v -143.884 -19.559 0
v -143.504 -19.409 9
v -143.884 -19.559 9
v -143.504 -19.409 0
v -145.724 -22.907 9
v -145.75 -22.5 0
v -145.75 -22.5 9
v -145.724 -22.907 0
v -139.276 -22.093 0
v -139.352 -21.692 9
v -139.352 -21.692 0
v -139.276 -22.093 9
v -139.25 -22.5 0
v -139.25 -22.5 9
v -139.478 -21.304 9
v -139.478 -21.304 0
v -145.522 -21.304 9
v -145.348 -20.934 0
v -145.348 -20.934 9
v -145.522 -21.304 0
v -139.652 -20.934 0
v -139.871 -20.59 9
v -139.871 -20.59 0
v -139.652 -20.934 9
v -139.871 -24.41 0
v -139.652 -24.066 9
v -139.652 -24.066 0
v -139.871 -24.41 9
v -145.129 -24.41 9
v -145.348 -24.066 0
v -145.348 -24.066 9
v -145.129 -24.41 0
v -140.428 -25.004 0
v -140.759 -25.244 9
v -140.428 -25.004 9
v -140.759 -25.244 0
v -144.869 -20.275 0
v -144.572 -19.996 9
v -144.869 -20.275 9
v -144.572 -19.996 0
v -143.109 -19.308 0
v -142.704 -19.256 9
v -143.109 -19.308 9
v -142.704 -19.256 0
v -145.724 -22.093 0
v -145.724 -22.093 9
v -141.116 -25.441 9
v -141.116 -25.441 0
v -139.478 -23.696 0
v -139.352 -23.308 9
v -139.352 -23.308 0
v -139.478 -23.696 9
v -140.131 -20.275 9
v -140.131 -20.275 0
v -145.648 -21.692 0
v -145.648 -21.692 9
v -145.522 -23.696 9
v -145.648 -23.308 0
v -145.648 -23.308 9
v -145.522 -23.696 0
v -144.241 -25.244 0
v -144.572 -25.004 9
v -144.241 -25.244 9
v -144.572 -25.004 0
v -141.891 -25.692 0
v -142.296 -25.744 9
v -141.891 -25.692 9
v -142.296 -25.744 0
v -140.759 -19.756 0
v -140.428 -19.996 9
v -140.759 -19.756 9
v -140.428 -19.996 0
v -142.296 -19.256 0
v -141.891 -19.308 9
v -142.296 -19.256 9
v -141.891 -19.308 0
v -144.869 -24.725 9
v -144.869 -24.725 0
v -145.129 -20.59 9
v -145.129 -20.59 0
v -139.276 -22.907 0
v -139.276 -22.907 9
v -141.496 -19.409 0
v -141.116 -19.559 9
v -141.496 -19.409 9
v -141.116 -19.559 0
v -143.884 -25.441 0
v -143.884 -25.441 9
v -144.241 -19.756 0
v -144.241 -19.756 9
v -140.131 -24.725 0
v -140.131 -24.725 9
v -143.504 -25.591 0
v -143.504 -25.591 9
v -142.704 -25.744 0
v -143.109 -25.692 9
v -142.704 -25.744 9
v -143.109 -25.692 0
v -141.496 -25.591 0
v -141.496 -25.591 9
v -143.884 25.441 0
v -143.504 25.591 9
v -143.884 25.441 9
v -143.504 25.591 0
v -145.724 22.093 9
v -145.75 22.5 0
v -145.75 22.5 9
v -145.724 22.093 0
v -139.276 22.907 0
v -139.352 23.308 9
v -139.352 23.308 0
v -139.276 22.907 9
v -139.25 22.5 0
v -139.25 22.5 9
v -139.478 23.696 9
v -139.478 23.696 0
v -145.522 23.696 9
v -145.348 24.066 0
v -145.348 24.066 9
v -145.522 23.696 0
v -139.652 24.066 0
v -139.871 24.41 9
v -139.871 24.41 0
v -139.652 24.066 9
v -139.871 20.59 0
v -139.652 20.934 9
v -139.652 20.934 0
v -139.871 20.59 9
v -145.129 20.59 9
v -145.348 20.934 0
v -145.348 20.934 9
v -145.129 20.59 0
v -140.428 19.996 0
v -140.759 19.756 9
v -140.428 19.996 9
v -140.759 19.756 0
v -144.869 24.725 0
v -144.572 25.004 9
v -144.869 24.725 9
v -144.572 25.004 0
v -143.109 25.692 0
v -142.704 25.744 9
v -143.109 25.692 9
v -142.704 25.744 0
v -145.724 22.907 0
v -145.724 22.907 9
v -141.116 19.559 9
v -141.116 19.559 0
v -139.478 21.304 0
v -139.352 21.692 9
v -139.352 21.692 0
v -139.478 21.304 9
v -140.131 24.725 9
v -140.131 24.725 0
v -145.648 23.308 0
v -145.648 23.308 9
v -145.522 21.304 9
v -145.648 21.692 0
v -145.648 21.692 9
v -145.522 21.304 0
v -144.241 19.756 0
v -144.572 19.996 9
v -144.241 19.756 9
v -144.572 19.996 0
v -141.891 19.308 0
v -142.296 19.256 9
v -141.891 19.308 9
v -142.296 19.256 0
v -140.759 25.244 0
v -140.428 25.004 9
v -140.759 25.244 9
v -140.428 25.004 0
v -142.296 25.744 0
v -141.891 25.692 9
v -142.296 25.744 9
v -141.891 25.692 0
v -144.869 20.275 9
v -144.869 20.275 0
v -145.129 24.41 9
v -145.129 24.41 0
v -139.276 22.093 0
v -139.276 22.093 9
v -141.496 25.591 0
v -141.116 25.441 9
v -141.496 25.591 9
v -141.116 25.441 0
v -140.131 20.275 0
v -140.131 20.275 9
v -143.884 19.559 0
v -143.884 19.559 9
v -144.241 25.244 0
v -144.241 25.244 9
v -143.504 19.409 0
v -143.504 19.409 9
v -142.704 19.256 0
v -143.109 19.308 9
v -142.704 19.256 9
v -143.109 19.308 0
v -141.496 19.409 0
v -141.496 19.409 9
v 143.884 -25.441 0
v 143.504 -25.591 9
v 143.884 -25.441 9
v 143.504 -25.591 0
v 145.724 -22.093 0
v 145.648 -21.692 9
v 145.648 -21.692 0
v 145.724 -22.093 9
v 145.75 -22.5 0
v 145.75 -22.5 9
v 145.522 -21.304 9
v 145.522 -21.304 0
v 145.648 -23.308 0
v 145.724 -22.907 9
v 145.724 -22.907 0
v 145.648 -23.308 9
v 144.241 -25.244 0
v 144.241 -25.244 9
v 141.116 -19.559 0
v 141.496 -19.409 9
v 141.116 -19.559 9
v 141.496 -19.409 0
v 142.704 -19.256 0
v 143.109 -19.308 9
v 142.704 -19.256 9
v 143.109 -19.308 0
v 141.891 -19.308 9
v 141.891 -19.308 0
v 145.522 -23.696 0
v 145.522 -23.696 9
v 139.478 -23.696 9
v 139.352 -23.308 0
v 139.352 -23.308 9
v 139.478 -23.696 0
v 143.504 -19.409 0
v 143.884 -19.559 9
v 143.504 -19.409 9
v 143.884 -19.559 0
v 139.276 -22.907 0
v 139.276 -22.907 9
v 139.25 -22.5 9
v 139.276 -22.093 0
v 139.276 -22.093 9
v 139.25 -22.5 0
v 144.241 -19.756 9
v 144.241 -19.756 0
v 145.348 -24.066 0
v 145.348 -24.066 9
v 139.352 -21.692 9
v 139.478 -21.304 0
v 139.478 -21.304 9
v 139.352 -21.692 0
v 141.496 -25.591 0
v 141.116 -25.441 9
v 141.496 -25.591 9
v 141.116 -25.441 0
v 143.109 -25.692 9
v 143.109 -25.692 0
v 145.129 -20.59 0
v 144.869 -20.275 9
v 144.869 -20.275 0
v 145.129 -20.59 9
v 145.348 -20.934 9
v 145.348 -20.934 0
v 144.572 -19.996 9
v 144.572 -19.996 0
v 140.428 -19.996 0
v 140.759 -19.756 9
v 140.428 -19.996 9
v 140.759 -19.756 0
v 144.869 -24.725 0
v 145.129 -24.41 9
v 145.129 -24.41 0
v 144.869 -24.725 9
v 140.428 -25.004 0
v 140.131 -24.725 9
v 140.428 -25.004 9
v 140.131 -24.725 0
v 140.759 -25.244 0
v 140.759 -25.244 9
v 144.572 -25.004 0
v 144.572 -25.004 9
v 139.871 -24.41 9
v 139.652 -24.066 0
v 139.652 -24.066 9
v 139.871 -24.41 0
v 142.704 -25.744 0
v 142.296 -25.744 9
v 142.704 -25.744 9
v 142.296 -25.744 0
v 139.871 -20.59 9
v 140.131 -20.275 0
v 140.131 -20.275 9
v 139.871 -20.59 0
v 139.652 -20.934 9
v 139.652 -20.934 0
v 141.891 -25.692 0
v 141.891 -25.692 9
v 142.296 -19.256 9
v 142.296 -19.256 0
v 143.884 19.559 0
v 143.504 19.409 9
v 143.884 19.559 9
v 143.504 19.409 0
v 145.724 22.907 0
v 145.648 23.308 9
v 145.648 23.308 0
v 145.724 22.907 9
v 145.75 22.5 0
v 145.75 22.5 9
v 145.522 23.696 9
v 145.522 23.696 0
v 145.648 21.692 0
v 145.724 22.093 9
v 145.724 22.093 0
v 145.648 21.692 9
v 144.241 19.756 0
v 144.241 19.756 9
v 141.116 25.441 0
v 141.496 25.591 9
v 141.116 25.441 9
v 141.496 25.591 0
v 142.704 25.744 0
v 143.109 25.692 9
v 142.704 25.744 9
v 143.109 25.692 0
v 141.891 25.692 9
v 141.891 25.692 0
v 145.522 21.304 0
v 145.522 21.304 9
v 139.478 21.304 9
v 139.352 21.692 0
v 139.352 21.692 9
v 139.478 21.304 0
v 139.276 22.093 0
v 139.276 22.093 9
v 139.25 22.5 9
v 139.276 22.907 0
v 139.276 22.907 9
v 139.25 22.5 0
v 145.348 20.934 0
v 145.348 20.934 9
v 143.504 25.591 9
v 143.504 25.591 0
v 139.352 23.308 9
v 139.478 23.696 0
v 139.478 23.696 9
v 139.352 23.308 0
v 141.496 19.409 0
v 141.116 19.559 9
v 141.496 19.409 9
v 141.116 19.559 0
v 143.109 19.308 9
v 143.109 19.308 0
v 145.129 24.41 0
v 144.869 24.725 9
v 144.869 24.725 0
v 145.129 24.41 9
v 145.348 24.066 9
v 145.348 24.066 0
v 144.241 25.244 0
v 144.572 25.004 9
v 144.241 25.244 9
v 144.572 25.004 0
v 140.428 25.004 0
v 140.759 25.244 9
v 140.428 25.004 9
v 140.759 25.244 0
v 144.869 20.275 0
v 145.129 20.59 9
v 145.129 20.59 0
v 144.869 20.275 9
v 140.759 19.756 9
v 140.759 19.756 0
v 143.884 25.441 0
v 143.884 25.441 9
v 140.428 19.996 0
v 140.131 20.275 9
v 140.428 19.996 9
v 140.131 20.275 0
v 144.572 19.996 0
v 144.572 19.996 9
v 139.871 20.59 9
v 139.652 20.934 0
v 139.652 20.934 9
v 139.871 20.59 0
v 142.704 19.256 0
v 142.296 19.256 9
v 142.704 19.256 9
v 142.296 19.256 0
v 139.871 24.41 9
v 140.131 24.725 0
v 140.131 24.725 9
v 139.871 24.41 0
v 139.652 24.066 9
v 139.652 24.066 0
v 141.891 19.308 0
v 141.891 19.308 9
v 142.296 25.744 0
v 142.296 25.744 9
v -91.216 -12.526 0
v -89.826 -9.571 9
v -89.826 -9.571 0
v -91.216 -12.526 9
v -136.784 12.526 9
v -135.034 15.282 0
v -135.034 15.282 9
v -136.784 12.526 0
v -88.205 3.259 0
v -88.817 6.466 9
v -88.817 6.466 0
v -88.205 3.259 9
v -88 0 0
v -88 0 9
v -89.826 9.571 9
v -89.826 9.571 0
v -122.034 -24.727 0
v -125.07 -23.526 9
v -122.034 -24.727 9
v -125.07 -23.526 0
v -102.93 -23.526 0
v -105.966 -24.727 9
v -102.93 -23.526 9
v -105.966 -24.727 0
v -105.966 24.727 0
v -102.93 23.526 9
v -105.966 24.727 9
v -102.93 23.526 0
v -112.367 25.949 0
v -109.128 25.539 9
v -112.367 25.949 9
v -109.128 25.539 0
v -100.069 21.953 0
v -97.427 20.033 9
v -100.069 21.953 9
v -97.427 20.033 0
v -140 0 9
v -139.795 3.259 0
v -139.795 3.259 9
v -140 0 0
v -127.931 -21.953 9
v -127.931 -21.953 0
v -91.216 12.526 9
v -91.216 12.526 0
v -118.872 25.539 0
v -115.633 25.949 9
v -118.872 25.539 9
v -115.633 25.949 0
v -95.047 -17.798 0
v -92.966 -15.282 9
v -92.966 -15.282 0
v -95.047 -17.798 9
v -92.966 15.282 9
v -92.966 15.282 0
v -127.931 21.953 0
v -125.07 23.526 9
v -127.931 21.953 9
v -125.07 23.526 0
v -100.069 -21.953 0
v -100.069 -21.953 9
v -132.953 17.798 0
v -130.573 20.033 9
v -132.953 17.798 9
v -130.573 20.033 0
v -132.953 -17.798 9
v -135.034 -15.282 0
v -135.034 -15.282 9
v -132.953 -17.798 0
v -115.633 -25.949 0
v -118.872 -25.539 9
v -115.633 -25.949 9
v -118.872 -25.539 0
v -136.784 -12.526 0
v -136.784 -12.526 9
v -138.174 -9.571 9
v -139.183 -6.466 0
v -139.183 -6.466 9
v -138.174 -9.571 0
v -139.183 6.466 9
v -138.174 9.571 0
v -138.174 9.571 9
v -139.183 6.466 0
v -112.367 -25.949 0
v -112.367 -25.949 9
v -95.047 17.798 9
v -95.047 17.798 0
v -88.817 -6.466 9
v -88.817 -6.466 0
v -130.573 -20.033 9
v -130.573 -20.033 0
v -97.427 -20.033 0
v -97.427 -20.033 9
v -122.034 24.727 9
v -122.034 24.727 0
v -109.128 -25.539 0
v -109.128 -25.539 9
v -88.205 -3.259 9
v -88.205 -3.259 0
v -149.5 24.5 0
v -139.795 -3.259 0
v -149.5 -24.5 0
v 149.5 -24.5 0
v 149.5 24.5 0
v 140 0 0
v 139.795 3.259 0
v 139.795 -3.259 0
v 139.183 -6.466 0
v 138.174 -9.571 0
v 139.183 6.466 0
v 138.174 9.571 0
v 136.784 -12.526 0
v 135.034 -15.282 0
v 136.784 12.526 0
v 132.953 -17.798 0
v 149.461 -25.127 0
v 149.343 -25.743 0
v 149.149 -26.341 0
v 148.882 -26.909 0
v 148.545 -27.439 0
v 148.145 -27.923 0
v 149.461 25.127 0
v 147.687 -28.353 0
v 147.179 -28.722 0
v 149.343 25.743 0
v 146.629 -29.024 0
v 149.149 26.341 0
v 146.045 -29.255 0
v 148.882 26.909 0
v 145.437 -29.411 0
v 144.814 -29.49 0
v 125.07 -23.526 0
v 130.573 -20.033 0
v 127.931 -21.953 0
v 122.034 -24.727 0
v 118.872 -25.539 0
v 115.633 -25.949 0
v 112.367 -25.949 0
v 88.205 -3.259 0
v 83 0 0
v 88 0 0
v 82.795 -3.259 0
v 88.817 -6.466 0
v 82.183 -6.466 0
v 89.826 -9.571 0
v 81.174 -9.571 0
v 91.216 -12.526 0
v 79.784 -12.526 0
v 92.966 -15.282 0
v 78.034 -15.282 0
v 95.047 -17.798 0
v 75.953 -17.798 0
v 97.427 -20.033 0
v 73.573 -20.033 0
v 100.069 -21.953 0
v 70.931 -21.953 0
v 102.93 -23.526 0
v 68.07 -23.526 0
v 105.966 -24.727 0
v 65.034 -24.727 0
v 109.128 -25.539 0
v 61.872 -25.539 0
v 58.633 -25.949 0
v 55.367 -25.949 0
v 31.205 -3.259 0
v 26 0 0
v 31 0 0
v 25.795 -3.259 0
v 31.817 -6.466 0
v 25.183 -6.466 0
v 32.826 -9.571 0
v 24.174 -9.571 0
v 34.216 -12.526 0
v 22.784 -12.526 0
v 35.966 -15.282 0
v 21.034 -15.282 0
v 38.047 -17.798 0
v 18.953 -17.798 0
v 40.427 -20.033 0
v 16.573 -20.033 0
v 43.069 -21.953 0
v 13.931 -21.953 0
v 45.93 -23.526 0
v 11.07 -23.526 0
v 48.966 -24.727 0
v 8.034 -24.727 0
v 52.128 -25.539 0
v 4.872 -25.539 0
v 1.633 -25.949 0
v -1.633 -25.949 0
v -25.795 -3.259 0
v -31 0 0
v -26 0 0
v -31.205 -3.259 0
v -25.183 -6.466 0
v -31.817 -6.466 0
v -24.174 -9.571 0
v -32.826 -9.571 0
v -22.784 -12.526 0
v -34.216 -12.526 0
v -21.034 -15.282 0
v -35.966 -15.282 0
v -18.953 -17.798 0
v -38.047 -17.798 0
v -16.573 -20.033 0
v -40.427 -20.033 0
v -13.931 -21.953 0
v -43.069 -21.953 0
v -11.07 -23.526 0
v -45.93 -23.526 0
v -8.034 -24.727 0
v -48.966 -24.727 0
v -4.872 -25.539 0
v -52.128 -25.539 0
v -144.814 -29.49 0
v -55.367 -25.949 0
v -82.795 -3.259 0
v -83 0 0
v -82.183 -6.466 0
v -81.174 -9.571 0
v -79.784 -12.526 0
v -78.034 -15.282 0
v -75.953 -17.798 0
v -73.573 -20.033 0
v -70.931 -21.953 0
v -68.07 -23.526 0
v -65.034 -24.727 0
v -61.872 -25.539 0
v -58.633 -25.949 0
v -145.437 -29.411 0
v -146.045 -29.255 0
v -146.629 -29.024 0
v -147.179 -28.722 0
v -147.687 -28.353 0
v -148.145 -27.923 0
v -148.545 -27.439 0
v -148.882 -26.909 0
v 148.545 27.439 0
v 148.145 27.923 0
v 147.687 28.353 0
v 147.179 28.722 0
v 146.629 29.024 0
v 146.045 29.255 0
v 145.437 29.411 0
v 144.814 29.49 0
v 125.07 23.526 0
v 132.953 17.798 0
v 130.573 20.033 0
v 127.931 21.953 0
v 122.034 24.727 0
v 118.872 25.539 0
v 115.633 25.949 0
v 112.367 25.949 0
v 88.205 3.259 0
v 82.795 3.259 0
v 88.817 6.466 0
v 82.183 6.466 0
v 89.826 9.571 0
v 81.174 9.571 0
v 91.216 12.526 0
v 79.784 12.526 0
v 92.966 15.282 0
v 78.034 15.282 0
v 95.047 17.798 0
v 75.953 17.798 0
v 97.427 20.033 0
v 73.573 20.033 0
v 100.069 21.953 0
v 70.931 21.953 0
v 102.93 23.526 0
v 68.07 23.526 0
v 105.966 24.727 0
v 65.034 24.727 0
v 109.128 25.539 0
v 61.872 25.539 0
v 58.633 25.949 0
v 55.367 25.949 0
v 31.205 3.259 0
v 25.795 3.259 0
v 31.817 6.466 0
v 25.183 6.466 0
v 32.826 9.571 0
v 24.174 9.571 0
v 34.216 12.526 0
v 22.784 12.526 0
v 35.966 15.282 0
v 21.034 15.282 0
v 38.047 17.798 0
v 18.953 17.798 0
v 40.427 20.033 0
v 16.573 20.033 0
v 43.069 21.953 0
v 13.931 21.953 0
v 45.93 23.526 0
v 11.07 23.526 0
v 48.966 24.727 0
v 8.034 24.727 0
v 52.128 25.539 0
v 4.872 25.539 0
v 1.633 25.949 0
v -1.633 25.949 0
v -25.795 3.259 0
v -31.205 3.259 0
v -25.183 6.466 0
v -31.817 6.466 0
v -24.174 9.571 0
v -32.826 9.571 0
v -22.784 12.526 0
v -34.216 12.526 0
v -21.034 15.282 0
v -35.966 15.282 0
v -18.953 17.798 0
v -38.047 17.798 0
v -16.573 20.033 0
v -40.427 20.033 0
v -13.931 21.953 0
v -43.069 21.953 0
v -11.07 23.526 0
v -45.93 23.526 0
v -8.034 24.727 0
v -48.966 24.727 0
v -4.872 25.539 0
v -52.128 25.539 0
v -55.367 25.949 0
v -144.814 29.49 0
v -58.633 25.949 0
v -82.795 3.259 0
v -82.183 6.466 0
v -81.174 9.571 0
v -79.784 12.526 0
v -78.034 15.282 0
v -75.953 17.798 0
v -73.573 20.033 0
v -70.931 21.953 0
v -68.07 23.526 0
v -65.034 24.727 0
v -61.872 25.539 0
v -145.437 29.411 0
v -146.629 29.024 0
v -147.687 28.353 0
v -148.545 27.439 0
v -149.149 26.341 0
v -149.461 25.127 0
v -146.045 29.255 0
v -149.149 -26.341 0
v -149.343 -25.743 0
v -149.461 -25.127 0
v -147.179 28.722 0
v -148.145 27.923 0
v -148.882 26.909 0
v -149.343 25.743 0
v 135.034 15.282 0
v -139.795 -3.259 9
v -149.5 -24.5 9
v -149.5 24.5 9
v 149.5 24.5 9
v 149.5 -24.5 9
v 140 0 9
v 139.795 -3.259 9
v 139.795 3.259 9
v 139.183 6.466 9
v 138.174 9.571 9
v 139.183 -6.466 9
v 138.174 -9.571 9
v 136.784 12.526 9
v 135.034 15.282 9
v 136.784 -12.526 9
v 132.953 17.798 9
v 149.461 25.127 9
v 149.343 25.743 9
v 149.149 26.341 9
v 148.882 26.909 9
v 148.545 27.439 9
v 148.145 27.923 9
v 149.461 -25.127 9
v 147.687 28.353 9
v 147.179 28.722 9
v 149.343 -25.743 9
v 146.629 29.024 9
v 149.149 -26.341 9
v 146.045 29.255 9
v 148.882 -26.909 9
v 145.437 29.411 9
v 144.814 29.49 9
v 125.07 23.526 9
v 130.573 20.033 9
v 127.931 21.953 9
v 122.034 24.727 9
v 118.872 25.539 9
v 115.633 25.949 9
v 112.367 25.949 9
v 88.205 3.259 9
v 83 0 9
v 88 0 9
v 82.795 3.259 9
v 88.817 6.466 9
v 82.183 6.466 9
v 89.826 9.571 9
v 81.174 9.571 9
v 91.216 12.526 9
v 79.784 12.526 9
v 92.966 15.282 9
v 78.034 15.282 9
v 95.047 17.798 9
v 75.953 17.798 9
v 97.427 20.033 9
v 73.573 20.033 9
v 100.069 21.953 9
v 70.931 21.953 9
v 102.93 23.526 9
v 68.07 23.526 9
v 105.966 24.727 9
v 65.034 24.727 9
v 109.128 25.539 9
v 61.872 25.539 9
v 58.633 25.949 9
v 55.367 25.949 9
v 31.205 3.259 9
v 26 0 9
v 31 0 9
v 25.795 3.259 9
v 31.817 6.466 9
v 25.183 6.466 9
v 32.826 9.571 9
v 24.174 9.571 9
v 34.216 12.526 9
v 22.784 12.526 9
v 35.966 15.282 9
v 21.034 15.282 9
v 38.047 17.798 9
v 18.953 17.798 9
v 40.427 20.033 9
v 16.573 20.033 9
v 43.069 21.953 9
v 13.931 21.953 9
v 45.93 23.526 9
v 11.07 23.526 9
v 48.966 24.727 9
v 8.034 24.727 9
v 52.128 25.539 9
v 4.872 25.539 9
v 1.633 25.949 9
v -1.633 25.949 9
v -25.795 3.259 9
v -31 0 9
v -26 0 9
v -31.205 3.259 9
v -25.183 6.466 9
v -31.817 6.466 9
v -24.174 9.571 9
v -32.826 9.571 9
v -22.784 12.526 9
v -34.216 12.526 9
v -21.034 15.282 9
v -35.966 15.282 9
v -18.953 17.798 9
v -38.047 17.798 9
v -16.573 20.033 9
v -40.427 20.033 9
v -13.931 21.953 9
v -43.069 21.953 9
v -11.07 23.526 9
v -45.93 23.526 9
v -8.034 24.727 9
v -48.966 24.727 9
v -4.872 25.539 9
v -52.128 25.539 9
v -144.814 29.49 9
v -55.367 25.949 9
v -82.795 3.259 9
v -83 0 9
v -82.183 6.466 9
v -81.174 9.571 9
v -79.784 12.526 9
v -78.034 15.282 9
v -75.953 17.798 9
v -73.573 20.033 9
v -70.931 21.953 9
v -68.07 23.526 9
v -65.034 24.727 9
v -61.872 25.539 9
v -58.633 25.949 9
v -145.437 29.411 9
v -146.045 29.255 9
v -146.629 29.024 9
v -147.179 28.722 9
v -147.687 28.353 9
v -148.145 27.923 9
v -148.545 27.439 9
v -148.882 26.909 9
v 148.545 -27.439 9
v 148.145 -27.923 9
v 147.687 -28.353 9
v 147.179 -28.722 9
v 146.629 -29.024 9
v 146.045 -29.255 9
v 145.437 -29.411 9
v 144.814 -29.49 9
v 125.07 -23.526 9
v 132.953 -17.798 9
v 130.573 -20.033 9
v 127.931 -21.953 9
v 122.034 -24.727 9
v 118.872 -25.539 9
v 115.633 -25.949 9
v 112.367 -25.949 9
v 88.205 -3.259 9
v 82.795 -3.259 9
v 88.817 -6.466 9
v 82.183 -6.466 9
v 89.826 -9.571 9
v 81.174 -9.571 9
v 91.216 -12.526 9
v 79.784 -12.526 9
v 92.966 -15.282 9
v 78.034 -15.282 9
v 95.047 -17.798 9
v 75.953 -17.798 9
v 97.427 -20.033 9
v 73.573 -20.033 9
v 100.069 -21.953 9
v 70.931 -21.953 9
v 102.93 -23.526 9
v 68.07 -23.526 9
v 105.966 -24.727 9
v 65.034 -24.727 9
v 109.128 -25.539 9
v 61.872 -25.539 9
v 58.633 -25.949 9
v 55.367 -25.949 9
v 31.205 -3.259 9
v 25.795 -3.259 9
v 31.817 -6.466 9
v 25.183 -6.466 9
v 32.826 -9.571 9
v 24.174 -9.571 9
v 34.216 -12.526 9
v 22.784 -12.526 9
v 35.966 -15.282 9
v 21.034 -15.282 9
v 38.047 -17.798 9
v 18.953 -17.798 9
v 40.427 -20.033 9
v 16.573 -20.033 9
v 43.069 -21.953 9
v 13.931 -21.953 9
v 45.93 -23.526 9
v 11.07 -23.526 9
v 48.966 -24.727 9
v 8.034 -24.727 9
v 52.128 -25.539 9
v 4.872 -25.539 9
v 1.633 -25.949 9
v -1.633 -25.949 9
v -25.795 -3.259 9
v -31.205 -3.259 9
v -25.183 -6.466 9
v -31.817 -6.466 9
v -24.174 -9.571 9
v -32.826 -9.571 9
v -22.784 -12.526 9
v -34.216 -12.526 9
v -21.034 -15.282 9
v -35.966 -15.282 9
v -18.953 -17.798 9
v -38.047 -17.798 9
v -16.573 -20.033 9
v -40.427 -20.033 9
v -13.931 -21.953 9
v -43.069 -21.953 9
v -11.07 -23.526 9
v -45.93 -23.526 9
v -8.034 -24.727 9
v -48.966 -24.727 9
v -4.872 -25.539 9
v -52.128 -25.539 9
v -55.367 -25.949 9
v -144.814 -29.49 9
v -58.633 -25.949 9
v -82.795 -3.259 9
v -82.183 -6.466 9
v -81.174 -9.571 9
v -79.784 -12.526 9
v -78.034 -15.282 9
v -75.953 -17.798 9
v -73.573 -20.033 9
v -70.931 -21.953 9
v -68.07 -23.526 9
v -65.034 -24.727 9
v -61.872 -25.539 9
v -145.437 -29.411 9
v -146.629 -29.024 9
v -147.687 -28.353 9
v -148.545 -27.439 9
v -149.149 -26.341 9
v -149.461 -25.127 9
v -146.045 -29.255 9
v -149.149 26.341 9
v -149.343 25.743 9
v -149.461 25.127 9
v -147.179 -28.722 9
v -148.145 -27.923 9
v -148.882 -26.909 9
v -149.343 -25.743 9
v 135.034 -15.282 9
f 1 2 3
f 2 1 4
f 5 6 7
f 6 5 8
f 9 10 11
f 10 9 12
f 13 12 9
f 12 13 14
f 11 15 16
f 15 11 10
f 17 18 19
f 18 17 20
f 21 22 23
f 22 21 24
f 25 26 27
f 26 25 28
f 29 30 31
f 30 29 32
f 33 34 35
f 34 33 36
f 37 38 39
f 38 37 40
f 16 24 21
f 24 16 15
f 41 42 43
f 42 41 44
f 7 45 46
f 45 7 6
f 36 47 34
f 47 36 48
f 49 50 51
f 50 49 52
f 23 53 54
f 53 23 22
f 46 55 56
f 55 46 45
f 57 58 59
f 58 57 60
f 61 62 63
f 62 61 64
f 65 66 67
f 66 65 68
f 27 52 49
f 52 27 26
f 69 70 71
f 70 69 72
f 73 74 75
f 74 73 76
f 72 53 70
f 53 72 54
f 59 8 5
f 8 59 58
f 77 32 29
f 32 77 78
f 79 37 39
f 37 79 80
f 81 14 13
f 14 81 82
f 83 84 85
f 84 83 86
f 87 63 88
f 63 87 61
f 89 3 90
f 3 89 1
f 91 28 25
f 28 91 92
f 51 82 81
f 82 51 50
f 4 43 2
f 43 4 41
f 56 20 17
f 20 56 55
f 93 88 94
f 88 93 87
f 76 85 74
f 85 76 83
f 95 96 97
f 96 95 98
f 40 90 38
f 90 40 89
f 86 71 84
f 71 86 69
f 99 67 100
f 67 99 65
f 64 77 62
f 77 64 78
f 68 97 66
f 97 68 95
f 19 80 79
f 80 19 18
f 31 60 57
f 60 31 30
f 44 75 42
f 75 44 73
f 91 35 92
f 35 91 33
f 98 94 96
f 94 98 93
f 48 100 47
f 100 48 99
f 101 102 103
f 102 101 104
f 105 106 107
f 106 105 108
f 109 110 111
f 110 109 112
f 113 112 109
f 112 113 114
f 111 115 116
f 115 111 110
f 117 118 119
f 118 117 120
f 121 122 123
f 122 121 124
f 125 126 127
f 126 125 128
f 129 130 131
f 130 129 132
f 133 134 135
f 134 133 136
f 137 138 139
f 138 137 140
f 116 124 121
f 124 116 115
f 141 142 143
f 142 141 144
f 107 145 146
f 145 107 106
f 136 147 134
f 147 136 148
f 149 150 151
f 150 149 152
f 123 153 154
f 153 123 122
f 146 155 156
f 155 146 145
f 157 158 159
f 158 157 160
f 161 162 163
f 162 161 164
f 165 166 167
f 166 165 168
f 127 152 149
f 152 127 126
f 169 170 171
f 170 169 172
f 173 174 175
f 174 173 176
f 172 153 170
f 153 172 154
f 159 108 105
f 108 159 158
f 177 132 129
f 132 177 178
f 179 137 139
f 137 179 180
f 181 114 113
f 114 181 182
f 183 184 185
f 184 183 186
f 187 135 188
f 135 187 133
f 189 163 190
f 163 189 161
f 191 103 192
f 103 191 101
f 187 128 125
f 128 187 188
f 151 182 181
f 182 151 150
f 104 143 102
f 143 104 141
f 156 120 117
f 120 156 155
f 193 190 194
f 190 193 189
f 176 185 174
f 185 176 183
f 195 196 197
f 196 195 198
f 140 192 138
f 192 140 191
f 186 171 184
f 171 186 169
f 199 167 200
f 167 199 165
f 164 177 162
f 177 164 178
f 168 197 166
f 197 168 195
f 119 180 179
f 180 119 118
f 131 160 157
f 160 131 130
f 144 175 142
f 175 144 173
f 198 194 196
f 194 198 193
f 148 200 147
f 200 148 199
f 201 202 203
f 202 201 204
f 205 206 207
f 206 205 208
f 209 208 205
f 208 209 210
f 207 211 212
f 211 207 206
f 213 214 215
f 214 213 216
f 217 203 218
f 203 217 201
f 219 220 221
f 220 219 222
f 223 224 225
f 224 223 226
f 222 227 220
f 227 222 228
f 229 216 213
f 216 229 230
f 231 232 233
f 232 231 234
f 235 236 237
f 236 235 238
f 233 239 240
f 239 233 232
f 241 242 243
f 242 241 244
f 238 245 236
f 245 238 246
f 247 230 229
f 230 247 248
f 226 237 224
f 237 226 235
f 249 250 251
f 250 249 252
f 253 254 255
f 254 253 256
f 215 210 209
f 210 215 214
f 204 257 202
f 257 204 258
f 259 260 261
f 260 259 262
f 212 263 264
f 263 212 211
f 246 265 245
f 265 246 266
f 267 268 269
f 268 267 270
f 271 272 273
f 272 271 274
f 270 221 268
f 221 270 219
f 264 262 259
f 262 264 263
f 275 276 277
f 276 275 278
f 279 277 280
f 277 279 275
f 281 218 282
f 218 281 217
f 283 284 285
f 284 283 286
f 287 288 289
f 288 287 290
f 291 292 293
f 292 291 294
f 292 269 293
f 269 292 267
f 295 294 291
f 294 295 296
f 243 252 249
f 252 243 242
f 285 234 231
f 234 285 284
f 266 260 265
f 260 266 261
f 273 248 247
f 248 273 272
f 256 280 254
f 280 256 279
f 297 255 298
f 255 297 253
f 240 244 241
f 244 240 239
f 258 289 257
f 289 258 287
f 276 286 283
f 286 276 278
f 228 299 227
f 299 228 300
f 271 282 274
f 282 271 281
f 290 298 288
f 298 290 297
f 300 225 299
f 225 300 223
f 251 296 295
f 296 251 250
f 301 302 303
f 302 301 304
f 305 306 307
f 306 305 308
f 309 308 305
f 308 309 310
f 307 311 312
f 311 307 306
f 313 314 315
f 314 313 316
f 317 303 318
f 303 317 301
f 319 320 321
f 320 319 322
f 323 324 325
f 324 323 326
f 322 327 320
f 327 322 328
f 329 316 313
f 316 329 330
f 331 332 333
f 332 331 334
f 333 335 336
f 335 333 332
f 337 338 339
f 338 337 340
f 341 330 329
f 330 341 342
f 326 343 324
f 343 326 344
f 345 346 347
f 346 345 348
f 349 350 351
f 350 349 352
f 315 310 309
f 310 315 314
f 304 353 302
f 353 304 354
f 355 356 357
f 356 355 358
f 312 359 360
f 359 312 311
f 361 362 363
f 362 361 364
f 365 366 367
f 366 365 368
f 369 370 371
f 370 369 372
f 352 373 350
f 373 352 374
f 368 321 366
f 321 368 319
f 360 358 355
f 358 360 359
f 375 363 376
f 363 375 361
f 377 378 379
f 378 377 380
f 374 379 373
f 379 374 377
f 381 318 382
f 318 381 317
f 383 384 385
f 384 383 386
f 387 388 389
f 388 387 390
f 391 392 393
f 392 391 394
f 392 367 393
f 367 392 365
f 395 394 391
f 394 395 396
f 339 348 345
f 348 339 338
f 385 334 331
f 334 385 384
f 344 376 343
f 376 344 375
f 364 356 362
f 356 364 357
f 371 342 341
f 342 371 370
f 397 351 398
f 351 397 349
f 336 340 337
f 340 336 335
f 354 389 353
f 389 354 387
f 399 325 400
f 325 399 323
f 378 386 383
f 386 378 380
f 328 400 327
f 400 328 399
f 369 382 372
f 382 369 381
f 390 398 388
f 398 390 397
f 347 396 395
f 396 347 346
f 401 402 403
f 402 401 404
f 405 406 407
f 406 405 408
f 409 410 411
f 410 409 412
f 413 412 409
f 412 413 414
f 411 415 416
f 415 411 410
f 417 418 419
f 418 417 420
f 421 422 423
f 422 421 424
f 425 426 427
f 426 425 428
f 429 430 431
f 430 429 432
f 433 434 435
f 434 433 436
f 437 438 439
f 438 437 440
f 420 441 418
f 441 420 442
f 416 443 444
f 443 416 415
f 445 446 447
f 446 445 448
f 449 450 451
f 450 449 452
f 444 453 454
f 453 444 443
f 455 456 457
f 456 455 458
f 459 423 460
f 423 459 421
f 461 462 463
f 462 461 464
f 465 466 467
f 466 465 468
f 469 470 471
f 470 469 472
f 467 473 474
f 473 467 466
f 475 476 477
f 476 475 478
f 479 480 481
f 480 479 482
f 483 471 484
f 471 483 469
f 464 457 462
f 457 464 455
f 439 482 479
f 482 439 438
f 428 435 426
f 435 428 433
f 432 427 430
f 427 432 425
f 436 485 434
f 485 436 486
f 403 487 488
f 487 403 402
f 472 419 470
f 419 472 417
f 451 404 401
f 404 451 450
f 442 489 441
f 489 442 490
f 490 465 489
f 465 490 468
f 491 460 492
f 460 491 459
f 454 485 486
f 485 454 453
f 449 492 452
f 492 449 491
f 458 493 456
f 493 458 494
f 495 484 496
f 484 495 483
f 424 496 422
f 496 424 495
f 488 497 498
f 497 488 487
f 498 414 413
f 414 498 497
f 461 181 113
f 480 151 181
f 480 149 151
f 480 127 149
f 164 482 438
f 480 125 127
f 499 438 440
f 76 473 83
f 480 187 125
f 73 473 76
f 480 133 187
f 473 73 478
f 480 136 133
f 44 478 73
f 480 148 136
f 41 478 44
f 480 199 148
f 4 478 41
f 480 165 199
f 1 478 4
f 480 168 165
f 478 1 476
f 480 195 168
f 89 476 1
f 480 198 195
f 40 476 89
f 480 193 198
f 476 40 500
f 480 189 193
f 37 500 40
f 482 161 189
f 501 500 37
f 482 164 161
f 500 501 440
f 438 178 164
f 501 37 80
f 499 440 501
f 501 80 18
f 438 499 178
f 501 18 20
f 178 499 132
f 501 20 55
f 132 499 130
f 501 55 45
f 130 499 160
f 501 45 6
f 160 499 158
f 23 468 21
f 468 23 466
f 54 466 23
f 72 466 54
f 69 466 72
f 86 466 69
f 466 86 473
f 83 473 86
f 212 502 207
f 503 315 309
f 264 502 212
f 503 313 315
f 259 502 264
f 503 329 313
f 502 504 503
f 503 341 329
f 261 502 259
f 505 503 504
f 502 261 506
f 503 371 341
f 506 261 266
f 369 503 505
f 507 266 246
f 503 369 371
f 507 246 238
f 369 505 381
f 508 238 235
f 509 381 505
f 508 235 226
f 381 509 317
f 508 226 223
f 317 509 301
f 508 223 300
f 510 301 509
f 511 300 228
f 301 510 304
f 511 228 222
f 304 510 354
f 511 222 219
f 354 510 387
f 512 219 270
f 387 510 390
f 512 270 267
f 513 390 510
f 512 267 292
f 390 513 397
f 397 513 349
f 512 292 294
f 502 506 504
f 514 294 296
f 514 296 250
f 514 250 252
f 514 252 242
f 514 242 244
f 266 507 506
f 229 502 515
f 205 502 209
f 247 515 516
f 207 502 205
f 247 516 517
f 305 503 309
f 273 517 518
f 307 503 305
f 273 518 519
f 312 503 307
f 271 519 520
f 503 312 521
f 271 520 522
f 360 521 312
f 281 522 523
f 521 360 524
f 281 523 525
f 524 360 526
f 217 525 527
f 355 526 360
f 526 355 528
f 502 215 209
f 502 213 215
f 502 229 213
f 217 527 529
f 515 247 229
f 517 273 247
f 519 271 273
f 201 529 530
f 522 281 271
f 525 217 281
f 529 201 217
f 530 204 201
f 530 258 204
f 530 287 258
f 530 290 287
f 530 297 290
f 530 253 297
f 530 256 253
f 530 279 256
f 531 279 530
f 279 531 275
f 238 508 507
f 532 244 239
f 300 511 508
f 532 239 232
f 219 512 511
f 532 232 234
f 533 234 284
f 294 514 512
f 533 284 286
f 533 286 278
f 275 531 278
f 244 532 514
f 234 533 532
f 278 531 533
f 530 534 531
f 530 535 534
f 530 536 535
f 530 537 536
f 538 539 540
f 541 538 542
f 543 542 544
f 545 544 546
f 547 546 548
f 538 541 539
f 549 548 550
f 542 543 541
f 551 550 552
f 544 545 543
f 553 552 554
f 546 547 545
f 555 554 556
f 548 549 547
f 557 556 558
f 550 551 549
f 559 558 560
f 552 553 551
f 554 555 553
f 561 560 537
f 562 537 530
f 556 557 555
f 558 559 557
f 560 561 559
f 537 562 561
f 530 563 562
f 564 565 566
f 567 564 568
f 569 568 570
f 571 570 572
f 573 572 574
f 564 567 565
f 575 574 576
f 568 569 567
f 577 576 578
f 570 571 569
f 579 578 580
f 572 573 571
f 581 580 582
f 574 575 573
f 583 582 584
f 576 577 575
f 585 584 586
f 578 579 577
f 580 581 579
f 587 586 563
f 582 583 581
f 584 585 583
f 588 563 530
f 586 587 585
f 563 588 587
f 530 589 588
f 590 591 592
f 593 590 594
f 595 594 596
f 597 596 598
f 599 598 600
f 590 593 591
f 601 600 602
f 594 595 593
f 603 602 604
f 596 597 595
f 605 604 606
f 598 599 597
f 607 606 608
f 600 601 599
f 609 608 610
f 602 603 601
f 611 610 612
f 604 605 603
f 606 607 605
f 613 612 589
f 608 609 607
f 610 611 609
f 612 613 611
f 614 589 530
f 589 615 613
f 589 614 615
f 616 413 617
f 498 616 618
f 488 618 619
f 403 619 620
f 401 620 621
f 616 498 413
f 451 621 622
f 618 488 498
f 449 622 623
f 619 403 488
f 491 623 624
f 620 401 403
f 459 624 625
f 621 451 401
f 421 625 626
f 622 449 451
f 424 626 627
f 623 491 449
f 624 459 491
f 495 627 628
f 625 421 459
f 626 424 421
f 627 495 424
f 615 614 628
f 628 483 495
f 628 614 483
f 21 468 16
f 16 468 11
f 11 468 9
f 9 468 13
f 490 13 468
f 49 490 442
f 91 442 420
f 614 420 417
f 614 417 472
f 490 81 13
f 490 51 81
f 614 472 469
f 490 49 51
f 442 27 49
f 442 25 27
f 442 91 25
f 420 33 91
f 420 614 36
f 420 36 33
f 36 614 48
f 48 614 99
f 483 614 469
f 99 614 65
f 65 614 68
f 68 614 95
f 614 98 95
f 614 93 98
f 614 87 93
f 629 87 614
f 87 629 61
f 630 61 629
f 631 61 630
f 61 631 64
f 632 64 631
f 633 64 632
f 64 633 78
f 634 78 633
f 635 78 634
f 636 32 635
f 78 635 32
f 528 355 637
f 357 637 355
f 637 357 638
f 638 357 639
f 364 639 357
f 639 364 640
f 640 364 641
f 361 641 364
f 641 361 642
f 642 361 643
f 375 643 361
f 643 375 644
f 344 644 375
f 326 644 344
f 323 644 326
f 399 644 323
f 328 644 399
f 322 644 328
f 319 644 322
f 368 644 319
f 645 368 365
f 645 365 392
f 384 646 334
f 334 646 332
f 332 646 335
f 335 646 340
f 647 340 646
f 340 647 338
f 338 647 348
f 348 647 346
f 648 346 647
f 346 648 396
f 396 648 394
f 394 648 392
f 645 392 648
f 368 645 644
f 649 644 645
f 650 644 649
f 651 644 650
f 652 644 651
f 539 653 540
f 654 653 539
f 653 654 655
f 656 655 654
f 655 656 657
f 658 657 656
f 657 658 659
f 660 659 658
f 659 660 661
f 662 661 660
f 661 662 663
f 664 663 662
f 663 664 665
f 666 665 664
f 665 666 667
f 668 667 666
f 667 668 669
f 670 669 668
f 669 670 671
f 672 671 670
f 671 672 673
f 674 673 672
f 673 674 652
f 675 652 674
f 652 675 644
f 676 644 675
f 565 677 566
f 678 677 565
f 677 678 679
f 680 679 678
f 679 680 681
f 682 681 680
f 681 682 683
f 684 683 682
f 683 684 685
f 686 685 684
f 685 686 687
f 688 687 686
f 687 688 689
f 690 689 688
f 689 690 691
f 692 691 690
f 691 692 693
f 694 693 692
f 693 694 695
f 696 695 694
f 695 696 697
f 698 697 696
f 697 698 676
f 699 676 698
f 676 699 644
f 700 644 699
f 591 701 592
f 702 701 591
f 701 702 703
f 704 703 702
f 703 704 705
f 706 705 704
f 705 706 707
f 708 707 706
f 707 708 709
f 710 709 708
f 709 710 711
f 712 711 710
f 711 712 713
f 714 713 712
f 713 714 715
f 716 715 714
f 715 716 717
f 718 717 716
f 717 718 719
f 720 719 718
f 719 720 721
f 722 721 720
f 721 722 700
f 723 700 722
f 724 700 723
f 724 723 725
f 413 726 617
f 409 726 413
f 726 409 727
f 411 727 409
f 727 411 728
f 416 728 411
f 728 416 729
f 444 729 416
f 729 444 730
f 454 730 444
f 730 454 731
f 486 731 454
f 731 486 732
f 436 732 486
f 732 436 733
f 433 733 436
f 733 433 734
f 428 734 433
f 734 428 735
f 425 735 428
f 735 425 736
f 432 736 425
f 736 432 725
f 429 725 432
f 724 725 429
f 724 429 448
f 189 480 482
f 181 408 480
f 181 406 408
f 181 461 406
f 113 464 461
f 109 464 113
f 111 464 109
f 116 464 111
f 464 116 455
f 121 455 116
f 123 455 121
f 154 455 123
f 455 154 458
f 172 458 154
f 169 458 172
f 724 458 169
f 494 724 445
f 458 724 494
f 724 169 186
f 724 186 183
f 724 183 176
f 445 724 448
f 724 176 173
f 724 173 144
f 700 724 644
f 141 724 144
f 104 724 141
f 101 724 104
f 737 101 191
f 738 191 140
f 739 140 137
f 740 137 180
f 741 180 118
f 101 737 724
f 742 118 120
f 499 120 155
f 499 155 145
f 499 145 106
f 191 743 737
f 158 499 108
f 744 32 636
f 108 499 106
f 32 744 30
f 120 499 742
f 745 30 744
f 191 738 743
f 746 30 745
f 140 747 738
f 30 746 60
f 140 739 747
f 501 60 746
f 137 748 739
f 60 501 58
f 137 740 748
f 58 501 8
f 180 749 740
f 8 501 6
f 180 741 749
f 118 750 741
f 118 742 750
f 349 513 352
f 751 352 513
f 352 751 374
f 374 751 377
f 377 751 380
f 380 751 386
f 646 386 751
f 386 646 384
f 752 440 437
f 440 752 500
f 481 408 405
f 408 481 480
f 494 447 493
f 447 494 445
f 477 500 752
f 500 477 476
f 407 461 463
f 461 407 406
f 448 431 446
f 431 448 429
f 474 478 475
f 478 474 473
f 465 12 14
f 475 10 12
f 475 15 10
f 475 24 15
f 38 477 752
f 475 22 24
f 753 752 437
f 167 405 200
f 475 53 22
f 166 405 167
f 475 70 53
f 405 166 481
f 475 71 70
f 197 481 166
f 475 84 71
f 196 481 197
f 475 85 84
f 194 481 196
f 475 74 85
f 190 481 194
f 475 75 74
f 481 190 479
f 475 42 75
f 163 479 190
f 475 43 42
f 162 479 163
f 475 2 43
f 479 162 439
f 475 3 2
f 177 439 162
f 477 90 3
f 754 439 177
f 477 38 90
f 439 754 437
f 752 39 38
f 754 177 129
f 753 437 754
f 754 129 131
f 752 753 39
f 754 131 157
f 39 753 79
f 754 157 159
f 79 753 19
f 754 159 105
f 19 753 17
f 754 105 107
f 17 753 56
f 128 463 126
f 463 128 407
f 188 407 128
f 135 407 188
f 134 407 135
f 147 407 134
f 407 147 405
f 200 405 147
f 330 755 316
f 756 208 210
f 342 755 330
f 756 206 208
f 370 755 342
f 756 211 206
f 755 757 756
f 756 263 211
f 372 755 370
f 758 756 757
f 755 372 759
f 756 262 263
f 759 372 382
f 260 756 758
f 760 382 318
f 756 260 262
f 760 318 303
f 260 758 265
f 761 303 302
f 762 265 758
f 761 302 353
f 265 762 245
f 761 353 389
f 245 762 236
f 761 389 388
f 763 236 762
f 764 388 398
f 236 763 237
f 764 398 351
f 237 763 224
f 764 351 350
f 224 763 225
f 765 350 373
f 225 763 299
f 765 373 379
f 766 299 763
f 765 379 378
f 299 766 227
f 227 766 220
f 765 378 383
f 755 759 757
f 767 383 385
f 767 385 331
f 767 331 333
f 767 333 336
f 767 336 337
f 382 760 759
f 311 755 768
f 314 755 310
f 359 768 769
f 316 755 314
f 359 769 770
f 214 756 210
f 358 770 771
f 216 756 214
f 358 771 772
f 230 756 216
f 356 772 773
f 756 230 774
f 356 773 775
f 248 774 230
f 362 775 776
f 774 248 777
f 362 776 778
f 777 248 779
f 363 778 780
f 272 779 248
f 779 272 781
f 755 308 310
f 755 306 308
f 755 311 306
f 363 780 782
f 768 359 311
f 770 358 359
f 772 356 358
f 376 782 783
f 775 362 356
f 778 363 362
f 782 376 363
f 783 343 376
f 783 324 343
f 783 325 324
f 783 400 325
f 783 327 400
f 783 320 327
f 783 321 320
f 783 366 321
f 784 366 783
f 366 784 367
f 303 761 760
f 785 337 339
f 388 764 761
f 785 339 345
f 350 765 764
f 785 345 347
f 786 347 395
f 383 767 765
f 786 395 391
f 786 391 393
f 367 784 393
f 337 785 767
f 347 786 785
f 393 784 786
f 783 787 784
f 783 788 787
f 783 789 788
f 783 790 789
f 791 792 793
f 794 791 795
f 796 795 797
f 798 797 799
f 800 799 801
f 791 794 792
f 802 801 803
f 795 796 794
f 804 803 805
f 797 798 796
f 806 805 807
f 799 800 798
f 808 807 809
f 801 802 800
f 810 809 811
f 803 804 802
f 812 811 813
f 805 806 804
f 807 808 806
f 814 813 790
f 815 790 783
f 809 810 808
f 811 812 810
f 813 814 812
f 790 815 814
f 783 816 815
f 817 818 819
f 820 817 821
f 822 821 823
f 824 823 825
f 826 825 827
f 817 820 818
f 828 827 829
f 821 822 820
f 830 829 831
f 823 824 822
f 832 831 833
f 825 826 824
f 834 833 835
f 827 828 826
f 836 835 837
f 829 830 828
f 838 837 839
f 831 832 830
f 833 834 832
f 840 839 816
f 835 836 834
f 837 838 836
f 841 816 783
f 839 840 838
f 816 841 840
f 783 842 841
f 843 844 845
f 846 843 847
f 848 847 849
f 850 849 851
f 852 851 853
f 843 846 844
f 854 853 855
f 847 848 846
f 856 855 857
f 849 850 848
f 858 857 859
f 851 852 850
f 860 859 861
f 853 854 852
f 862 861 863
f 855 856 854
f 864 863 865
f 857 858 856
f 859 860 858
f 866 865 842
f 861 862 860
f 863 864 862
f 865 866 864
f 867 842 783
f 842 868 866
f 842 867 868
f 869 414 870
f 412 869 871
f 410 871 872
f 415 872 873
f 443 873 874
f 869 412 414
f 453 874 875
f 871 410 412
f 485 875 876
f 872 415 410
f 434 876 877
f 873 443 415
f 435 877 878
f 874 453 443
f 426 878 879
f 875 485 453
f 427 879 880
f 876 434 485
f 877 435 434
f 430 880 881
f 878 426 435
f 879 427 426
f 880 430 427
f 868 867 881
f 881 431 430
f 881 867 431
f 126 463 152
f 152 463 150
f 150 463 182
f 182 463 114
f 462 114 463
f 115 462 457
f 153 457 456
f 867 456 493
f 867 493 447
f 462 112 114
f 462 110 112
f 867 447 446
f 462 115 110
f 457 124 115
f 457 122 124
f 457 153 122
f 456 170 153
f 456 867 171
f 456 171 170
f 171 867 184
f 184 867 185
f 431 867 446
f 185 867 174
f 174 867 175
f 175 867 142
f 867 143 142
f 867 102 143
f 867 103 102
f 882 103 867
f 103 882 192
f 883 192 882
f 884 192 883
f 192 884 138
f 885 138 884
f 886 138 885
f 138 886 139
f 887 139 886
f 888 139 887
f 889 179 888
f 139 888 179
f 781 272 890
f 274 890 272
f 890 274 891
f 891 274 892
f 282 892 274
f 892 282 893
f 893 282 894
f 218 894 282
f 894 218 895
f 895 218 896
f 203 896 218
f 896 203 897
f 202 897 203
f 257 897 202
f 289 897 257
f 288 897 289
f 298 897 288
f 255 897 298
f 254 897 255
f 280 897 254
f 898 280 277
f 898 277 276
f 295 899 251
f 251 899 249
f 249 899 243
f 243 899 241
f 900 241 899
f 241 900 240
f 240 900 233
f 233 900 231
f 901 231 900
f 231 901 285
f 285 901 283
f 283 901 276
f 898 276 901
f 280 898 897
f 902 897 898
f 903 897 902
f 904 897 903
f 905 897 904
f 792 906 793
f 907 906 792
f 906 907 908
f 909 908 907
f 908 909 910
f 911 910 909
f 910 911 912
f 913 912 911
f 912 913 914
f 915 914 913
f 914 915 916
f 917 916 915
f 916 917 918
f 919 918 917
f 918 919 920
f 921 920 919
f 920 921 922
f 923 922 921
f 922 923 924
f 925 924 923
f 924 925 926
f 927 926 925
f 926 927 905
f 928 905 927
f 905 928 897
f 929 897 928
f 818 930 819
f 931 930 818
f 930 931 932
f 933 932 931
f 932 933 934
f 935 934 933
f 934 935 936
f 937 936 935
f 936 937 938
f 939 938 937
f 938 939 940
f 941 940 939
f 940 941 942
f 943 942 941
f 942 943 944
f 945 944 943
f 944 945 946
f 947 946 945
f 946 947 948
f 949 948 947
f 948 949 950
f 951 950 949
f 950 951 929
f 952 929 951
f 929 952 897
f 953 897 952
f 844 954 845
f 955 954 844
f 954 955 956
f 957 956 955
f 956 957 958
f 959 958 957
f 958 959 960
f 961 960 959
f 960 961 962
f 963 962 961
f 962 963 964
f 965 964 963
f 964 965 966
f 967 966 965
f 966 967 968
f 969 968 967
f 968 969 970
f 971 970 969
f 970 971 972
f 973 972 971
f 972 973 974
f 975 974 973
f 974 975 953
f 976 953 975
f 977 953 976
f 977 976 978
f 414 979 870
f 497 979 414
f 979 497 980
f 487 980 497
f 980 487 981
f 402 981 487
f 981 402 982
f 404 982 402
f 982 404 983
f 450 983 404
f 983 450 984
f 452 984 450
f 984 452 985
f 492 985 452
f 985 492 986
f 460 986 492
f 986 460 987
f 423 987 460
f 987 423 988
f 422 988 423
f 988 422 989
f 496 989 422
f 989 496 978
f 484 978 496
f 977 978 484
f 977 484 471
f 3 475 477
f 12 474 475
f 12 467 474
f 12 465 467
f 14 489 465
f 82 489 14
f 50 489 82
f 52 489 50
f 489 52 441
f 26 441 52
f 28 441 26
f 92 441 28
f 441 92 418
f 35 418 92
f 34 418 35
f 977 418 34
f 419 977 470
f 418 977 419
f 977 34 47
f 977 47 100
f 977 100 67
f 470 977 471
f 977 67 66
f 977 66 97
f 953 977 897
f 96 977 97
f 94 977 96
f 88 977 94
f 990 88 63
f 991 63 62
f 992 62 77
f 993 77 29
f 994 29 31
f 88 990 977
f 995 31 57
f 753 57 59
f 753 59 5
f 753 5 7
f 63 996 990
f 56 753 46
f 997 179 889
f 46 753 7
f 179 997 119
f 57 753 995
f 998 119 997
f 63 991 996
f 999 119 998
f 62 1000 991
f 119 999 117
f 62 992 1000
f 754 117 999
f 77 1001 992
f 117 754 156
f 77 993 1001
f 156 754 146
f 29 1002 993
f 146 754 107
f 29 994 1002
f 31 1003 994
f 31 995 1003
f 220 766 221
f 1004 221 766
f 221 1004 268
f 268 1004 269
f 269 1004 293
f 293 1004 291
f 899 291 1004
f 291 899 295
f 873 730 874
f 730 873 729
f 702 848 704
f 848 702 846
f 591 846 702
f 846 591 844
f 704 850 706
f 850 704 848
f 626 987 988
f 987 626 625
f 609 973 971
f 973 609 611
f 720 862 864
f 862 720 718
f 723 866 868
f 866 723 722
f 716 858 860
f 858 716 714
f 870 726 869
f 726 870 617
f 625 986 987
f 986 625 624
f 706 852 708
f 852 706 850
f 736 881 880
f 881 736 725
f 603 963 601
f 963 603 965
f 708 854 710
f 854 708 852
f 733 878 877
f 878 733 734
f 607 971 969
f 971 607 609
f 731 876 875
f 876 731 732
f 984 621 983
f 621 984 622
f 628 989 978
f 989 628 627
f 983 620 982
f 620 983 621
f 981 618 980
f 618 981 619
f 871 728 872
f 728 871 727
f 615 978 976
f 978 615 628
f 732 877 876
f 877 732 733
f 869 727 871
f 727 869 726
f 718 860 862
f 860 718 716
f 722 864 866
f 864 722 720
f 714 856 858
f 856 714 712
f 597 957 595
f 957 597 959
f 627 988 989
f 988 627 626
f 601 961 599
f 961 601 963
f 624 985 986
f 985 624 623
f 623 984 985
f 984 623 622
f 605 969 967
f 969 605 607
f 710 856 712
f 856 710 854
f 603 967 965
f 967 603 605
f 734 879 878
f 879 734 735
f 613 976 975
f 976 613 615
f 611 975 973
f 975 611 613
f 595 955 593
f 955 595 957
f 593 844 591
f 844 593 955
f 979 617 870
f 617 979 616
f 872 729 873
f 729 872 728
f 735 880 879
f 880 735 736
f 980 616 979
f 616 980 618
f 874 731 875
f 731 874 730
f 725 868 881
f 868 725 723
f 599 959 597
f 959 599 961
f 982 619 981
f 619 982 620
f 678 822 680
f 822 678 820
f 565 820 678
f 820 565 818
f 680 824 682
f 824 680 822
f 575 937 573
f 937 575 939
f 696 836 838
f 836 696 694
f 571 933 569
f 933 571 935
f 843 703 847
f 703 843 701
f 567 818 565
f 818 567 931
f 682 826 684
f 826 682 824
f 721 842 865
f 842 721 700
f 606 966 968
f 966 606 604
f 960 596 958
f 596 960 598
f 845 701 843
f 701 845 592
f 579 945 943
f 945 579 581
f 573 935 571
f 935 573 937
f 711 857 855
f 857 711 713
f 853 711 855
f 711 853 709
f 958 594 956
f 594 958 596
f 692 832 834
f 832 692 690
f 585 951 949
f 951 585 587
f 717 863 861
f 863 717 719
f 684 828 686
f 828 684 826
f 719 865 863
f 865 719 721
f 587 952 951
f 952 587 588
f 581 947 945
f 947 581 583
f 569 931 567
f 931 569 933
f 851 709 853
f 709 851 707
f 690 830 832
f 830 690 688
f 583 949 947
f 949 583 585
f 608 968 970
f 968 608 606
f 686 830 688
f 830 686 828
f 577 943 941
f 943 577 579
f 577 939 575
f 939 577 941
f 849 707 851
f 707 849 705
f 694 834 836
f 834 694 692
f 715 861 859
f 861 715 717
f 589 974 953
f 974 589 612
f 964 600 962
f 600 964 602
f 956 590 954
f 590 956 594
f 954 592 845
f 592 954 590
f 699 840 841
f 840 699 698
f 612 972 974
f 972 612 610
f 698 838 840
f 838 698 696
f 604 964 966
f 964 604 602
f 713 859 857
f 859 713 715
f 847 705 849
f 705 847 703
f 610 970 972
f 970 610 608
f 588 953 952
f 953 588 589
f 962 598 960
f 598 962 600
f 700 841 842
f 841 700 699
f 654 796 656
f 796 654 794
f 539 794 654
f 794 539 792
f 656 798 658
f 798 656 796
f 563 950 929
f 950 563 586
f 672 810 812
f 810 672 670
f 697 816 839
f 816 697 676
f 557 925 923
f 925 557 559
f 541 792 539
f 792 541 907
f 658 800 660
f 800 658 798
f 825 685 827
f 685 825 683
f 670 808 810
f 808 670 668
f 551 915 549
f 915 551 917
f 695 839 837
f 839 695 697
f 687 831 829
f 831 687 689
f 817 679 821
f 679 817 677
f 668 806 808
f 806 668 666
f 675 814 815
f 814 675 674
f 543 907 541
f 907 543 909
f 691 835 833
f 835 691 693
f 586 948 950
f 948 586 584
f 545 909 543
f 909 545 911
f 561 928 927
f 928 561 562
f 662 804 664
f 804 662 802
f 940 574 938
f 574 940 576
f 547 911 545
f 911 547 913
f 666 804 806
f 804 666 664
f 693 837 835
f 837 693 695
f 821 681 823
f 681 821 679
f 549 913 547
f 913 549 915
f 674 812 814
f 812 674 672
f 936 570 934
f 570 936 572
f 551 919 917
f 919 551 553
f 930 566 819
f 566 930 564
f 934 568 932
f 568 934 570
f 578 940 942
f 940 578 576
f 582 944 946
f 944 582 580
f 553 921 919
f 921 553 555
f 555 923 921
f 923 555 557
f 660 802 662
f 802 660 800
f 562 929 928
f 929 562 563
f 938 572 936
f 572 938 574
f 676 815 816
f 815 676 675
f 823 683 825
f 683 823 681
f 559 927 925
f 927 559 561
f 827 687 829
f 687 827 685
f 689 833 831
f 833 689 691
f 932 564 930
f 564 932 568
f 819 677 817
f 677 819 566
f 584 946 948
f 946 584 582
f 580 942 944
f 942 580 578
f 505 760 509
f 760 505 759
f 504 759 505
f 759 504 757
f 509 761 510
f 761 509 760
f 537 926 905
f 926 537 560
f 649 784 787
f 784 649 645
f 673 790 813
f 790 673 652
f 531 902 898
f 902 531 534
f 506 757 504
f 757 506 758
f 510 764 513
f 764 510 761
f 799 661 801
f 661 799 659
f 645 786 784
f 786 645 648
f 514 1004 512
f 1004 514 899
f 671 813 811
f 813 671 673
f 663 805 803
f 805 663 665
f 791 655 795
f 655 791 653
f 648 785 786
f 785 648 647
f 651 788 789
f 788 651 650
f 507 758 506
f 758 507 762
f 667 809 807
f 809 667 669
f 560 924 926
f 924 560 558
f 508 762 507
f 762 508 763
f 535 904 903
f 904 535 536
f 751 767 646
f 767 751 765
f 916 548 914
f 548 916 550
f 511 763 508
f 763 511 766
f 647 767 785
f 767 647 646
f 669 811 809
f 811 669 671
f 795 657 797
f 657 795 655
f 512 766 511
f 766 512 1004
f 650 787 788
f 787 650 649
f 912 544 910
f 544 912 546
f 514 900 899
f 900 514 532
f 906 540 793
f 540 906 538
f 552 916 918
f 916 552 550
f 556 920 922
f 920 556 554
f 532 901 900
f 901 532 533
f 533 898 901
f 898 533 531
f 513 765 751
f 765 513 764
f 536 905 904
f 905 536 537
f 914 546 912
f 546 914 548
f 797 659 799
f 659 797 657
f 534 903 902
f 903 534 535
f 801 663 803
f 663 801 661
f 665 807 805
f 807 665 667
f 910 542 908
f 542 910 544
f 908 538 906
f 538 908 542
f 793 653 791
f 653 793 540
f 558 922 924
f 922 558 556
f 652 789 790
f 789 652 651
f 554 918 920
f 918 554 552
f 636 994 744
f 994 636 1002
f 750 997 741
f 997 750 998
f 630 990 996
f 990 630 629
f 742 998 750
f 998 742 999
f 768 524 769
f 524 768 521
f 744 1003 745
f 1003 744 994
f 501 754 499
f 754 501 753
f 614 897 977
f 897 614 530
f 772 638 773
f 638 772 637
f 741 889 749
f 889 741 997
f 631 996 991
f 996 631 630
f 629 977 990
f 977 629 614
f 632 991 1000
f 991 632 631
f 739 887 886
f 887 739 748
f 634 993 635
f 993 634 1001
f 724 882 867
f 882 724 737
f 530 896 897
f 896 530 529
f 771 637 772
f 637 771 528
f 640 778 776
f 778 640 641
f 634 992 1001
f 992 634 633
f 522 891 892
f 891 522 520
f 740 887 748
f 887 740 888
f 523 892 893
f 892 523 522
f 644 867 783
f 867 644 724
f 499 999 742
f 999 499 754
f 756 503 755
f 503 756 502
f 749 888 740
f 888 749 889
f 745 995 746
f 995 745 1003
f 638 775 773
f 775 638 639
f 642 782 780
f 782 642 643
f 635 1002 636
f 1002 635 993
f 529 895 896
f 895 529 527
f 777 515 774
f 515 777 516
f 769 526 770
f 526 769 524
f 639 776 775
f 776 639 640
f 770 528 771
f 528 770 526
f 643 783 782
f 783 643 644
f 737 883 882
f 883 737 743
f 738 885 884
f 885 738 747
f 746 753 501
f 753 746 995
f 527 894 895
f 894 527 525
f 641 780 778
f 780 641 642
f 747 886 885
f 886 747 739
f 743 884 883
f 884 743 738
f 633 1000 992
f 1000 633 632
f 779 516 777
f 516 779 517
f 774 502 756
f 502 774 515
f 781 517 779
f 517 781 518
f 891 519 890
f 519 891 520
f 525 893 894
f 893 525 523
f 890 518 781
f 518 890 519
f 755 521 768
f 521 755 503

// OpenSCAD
$fn = 50;

difference() {
	union() {
		hull() {
			translate(v = [-144.5, 24.5, 0]) {
				cylinder(h = 9, r = 5);
			}
			translate(v = [144.5, 24.5, 0]) {
				cylinder(h = 9, r = 5);
			}
			translate(v = [-144.5, -24.5, 0]) {
				cylinder(h = 9, r = 5);
			}
			translate(v = [144.5, -24.5, 0]) {
				cylinder(h = 9, r = 5);
			}
		}
	}
	union() {
		translate(v = [-142.5, -22.5, -100.0]) {
			cylinder(h = 200, r = 3.25);
		}
		translate(v = [-142.5, 22.5, -100.0]) {
			cylinder(h = 200, r = 3.25);
		}
		translate(v = [142.5, -22.5, -100.0]) {
			cylinder(h = 200, r = 3.25);
		}
		translate(v = [142.5, 22.5, -100.0]) {
			cylinder(h = 200, r = 3.25);
		}
		translate(v = [-142.5, -22.5, -100.0]) {
			cylinder(h = 200, r = 1.8);
		}
		translate(v = [-142.5, 22.5, -100.0]) {
			cylinder(h = 200, r = 1.8);
		}
		translate(v = [142.5, -22.5, -100.0]) {
			cylinder(h = 200, r = 1.8);
		}
		translate(v = [142.5, 22.5, -100.0]) {
			cylinder(h = 200, r = 1.8);
		}
		translate(v = [-114.0, 0, 0.0]) {
			cylinder(h = 9, r = 26.0);
		}
		translate(v = [-57.0, 0, 0.0]) {
			cylinder(h = 9, r = 26.0);
		}
		cylinder(h = 9, r = 26.0);
		translate(v = [57.0, 0, 0.0]) {
			cylinder(h = 9, r = 26.0);
		}
		translate(v = [114.0, 0, 0.0]) {
			cylinder(h = 9, r = 26.0);
		}
	}
}
